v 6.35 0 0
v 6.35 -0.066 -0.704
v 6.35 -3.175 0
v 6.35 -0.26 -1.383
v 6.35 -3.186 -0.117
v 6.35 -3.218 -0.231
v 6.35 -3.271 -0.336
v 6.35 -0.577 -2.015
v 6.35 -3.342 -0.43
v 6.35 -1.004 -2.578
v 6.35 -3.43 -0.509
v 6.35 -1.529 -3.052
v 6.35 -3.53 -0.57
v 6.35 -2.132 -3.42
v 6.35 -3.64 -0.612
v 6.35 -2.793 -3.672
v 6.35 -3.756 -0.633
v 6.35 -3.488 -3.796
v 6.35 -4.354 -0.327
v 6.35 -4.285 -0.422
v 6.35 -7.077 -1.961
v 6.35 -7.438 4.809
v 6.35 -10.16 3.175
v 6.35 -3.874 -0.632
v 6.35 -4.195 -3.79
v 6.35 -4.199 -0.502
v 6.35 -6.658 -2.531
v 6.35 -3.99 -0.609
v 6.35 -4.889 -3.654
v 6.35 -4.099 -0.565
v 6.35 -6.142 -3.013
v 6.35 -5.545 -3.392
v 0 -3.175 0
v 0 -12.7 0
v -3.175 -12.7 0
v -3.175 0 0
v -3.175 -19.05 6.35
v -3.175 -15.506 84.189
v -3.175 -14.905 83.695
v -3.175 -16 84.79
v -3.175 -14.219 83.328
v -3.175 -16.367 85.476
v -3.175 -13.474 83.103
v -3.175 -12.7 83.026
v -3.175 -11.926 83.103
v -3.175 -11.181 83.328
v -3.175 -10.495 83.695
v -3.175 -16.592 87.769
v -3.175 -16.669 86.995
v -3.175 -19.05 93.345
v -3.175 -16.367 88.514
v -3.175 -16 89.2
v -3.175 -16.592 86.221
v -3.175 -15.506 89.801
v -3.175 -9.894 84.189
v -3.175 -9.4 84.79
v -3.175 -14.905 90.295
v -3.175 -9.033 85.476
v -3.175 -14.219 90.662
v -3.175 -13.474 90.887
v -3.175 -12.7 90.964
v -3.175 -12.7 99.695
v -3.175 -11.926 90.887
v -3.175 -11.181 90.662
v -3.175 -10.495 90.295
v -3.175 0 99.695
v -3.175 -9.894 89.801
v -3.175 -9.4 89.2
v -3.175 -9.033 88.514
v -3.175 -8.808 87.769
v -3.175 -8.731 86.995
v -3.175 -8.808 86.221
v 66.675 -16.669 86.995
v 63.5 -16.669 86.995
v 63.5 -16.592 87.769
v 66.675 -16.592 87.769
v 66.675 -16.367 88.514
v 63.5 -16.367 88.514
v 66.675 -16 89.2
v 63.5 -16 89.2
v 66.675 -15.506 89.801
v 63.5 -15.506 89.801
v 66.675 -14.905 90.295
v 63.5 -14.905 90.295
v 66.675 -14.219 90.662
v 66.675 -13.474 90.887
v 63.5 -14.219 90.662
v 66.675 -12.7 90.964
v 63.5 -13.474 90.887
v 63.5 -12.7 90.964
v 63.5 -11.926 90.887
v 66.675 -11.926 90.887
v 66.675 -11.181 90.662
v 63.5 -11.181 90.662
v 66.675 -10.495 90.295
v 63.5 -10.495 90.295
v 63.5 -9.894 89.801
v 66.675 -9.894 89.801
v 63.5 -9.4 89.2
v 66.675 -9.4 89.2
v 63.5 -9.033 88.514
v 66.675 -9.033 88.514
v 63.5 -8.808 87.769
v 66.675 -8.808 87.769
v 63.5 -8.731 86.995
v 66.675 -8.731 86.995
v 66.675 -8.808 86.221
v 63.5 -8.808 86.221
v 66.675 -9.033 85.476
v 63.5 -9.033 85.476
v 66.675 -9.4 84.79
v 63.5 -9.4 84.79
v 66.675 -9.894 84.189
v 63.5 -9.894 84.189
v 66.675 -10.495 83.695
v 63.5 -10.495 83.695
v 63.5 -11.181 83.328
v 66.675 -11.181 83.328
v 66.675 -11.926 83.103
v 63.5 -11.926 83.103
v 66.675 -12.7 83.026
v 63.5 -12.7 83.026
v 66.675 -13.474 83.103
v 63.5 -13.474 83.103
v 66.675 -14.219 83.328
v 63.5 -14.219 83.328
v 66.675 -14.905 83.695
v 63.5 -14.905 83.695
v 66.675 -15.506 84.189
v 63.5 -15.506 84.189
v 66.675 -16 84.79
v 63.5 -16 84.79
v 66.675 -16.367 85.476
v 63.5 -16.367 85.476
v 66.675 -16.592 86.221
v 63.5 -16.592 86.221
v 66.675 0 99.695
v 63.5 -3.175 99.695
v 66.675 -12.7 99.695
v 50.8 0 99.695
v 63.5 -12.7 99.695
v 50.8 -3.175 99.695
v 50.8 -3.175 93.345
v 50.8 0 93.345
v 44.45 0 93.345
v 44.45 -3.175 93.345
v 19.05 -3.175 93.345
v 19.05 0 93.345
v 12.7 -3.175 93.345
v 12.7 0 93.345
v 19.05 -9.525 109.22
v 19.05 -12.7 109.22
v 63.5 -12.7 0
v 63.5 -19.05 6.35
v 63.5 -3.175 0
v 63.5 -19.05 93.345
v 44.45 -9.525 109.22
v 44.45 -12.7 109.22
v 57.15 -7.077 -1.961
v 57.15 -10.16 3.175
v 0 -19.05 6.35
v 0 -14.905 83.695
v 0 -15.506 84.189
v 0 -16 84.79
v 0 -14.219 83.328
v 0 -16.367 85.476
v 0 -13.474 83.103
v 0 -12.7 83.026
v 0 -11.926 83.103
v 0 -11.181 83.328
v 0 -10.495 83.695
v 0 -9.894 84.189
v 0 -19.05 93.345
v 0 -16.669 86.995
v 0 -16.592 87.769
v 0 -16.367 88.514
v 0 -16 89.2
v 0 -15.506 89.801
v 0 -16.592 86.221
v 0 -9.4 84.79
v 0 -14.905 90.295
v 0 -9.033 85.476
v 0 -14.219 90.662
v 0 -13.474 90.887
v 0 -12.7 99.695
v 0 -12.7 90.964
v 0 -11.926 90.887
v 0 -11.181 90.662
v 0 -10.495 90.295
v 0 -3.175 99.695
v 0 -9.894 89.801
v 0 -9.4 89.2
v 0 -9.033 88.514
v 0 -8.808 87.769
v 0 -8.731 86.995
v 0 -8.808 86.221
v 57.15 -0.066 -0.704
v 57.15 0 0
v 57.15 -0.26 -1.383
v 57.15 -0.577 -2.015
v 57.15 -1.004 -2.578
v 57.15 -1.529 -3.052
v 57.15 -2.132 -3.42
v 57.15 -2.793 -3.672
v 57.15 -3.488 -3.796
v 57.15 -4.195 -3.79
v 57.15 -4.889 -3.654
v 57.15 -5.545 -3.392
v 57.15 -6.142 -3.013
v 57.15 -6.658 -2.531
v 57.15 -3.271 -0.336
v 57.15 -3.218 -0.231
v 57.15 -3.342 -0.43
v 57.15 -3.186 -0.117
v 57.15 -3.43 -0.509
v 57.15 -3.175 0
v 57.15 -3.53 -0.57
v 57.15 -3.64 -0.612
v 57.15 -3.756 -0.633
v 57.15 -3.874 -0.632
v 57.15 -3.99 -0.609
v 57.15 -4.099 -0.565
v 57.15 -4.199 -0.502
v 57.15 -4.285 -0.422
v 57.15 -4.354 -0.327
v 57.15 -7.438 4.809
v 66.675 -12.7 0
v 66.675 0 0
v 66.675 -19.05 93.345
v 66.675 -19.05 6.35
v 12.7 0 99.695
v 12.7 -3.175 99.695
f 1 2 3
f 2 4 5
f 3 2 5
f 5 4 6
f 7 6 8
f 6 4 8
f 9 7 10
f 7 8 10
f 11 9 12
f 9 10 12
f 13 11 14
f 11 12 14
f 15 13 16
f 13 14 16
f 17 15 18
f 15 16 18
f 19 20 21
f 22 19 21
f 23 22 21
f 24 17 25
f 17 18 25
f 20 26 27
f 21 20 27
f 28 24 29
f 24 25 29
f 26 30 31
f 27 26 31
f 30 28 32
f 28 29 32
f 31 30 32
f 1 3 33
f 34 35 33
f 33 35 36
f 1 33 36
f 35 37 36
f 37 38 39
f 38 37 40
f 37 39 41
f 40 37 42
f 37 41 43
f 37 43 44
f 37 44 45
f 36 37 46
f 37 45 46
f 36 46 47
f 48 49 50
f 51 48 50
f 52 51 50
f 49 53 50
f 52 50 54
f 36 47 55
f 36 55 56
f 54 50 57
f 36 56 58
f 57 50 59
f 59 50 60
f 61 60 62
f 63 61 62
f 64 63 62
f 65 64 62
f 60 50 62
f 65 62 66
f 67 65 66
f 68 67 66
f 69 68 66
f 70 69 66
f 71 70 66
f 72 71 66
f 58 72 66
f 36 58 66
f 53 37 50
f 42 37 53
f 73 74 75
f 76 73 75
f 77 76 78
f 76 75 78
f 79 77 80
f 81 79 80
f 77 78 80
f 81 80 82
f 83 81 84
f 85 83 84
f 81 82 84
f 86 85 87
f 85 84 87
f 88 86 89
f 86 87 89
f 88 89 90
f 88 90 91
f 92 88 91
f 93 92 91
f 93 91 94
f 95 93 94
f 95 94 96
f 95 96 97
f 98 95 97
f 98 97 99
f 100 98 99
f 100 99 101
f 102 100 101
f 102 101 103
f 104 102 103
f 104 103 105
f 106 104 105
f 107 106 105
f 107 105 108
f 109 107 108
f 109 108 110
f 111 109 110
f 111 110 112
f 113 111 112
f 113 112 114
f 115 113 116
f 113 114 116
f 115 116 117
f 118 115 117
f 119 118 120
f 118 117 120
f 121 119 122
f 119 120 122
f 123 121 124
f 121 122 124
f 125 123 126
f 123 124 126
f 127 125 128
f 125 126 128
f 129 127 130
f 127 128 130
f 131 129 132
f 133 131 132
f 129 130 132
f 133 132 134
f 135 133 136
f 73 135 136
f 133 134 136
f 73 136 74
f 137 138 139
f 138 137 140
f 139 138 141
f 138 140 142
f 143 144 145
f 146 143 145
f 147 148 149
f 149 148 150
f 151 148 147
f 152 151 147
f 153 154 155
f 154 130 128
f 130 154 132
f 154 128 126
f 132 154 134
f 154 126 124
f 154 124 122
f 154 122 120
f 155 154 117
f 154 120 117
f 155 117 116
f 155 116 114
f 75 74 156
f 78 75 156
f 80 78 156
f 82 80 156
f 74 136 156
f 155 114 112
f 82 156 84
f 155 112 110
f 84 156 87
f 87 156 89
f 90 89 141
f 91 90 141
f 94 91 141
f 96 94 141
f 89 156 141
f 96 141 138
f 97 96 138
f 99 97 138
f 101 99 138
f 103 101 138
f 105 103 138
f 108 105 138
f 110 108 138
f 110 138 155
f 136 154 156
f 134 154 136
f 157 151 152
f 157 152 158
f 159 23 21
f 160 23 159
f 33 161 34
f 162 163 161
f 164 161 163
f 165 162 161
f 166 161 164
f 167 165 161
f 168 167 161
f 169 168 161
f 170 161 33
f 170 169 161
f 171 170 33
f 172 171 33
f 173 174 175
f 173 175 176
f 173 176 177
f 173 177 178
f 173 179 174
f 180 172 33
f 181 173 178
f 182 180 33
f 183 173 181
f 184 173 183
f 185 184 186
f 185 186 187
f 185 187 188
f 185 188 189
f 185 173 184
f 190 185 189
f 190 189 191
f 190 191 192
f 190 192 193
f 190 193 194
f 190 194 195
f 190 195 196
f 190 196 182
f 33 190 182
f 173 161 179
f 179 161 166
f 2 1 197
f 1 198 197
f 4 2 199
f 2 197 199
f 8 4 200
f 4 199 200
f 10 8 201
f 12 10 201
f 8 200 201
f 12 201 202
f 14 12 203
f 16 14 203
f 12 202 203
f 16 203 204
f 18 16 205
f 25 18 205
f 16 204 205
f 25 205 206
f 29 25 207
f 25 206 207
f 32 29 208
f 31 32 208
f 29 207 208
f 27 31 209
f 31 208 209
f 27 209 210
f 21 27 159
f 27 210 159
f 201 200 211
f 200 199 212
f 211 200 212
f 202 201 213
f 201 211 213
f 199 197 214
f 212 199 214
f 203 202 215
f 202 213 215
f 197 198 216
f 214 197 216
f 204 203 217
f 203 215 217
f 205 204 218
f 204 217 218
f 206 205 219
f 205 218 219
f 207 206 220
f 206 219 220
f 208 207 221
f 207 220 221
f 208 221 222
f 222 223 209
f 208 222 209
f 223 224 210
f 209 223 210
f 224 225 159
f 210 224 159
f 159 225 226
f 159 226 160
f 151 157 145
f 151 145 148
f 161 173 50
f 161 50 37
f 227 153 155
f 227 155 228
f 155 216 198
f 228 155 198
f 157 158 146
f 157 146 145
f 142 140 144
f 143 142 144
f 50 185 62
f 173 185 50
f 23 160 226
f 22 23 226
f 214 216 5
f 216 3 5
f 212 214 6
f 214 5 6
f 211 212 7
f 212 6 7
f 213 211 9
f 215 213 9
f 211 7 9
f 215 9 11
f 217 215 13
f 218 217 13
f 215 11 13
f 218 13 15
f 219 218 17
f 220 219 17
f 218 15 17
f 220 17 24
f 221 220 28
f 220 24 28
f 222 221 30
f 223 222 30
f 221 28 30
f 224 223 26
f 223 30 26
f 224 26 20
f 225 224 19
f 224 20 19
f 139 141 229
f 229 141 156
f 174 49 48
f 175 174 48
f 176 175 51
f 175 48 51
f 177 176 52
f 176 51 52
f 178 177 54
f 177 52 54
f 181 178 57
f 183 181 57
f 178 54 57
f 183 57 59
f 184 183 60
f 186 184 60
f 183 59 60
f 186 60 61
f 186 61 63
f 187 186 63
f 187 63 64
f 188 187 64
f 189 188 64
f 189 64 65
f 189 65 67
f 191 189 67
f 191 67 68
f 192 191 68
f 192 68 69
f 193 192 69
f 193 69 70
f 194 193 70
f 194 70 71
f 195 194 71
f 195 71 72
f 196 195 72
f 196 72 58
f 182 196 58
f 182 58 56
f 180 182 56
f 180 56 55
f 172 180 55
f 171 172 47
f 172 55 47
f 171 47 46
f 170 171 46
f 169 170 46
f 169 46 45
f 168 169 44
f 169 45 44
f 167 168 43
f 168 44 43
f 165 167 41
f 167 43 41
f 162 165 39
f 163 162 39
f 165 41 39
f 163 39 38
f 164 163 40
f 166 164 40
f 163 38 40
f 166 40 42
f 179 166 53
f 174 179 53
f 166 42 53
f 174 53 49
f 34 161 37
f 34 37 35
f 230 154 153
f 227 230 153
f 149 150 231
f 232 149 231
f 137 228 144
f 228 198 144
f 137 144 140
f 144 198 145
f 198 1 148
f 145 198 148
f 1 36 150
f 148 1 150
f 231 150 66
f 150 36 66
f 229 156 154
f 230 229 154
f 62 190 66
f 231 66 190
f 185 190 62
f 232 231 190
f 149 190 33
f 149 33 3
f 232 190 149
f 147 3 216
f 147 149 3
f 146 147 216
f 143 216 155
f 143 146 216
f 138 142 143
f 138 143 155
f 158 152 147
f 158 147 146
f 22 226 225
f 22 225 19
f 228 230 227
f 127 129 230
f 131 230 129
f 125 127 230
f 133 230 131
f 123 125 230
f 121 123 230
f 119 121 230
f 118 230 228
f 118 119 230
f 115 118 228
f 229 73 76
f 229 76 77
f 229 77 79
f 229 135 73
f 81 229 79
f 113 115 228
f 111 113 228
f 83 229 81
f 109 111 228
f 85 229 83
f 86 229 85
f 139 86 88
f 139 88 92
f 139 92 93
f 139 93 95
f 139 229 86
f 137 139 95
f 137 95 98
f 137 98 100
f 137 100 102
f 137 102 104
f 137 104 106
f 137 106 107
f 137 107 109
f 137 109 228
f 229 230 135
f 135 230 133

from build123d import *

# Parameters (mm, degrees)
F1_DEPTH  = 3.175
F3_DEPTH  = 3.175
F6_W      = 50.8
F6_H      = 3.175
F9_W      = 25.4
F9_H      = 3.175
F12_R     = 3.96875
F13_DEPTH = 69.851


# Not quite as in the source:
# - a feature of the source that left no trace in its solid (it failed there, or was rolled back) is left out
# - a pattern or mirror of a feature is missing from the dataset's text; its kind, count and spacing are read off the source's solid


with BuildPart() as f1:
    # F0 (on Front) → F1 (new body)
    with BuildSketch(Plane.XZ):
        Polygon((0, 99.695), (0, 0), (63.5, 0), (63.5, 99.695), (50.8, 99.695), (50.8, 93.345), (12.7, 93.345), (12.7, 99.695), align=None)
    extrude(amount=F1_DEPTH)

    # F2 (on Right) → F3 (join)
    with BuildSketch(Plane.YZ):
        Polygon((-12.7, 0), (0, 0), (0, 99.695), (-12.7, 99.695), (-19.05, 93.345), (-19.05, 6.35), align=None)
    f3 = extrude(amount=-F3_DEPTH)

    # F3_copies: F3 across plane
    add(f3.mirror(Plane(origin=(31.75, 0, 0), x_dir=(0, 0, 1), z_dir=(1, 0, 0))))

    # F8: sweep along a path in F7
    with BuildLine(Plane.YZ) as f8_path:
        ThreePointArc((0, 0), (-2.7925061525, -3.6716217493), (-7.0765387245, -1.9610774491))
        Line((-7.0765387245, -1.9610774491), (-10.16, 3.175))
    # F6 (on face) → F8 (sweep)
    with BuildSketch(Plane(origin=(0, 0, 0), x_dir=(1, 0, 0), z_dir=(0, 0, -1))):
        with Locations((31.75, 1.5875)):
            Rectangle(F6_W, F6_H)
    sweep(path=f8_path.line)

    # F11: sweep along a path in F10
    with BuildLine(Plane.YZ) as f11_path:
        Line((-3.175, 93.345), (-12.7, 109.22))
    # F9 (on face) → F11 (sweep)
    with BuildSketch(Plane.XY.offset(93.345)):
        with Locations((31.75, -1.5875)):
            Rectangle(F9_W, F9_H)
    sweep(path=f11_path.line)

    # F12 (on face) → F13 (cut, through all)
    with BuildSketch(Plane(origin=(-3.175, 0, 0), x_dir=(0, -1, 0), z_dir=(-1, 0, 0))):
        with Locations((12.7, 86.995)):
            Circle(F12_R)
    extrude(amount=-F13_DEPTH, mode=Mode.SUBTRACT)


solid = f1.part
